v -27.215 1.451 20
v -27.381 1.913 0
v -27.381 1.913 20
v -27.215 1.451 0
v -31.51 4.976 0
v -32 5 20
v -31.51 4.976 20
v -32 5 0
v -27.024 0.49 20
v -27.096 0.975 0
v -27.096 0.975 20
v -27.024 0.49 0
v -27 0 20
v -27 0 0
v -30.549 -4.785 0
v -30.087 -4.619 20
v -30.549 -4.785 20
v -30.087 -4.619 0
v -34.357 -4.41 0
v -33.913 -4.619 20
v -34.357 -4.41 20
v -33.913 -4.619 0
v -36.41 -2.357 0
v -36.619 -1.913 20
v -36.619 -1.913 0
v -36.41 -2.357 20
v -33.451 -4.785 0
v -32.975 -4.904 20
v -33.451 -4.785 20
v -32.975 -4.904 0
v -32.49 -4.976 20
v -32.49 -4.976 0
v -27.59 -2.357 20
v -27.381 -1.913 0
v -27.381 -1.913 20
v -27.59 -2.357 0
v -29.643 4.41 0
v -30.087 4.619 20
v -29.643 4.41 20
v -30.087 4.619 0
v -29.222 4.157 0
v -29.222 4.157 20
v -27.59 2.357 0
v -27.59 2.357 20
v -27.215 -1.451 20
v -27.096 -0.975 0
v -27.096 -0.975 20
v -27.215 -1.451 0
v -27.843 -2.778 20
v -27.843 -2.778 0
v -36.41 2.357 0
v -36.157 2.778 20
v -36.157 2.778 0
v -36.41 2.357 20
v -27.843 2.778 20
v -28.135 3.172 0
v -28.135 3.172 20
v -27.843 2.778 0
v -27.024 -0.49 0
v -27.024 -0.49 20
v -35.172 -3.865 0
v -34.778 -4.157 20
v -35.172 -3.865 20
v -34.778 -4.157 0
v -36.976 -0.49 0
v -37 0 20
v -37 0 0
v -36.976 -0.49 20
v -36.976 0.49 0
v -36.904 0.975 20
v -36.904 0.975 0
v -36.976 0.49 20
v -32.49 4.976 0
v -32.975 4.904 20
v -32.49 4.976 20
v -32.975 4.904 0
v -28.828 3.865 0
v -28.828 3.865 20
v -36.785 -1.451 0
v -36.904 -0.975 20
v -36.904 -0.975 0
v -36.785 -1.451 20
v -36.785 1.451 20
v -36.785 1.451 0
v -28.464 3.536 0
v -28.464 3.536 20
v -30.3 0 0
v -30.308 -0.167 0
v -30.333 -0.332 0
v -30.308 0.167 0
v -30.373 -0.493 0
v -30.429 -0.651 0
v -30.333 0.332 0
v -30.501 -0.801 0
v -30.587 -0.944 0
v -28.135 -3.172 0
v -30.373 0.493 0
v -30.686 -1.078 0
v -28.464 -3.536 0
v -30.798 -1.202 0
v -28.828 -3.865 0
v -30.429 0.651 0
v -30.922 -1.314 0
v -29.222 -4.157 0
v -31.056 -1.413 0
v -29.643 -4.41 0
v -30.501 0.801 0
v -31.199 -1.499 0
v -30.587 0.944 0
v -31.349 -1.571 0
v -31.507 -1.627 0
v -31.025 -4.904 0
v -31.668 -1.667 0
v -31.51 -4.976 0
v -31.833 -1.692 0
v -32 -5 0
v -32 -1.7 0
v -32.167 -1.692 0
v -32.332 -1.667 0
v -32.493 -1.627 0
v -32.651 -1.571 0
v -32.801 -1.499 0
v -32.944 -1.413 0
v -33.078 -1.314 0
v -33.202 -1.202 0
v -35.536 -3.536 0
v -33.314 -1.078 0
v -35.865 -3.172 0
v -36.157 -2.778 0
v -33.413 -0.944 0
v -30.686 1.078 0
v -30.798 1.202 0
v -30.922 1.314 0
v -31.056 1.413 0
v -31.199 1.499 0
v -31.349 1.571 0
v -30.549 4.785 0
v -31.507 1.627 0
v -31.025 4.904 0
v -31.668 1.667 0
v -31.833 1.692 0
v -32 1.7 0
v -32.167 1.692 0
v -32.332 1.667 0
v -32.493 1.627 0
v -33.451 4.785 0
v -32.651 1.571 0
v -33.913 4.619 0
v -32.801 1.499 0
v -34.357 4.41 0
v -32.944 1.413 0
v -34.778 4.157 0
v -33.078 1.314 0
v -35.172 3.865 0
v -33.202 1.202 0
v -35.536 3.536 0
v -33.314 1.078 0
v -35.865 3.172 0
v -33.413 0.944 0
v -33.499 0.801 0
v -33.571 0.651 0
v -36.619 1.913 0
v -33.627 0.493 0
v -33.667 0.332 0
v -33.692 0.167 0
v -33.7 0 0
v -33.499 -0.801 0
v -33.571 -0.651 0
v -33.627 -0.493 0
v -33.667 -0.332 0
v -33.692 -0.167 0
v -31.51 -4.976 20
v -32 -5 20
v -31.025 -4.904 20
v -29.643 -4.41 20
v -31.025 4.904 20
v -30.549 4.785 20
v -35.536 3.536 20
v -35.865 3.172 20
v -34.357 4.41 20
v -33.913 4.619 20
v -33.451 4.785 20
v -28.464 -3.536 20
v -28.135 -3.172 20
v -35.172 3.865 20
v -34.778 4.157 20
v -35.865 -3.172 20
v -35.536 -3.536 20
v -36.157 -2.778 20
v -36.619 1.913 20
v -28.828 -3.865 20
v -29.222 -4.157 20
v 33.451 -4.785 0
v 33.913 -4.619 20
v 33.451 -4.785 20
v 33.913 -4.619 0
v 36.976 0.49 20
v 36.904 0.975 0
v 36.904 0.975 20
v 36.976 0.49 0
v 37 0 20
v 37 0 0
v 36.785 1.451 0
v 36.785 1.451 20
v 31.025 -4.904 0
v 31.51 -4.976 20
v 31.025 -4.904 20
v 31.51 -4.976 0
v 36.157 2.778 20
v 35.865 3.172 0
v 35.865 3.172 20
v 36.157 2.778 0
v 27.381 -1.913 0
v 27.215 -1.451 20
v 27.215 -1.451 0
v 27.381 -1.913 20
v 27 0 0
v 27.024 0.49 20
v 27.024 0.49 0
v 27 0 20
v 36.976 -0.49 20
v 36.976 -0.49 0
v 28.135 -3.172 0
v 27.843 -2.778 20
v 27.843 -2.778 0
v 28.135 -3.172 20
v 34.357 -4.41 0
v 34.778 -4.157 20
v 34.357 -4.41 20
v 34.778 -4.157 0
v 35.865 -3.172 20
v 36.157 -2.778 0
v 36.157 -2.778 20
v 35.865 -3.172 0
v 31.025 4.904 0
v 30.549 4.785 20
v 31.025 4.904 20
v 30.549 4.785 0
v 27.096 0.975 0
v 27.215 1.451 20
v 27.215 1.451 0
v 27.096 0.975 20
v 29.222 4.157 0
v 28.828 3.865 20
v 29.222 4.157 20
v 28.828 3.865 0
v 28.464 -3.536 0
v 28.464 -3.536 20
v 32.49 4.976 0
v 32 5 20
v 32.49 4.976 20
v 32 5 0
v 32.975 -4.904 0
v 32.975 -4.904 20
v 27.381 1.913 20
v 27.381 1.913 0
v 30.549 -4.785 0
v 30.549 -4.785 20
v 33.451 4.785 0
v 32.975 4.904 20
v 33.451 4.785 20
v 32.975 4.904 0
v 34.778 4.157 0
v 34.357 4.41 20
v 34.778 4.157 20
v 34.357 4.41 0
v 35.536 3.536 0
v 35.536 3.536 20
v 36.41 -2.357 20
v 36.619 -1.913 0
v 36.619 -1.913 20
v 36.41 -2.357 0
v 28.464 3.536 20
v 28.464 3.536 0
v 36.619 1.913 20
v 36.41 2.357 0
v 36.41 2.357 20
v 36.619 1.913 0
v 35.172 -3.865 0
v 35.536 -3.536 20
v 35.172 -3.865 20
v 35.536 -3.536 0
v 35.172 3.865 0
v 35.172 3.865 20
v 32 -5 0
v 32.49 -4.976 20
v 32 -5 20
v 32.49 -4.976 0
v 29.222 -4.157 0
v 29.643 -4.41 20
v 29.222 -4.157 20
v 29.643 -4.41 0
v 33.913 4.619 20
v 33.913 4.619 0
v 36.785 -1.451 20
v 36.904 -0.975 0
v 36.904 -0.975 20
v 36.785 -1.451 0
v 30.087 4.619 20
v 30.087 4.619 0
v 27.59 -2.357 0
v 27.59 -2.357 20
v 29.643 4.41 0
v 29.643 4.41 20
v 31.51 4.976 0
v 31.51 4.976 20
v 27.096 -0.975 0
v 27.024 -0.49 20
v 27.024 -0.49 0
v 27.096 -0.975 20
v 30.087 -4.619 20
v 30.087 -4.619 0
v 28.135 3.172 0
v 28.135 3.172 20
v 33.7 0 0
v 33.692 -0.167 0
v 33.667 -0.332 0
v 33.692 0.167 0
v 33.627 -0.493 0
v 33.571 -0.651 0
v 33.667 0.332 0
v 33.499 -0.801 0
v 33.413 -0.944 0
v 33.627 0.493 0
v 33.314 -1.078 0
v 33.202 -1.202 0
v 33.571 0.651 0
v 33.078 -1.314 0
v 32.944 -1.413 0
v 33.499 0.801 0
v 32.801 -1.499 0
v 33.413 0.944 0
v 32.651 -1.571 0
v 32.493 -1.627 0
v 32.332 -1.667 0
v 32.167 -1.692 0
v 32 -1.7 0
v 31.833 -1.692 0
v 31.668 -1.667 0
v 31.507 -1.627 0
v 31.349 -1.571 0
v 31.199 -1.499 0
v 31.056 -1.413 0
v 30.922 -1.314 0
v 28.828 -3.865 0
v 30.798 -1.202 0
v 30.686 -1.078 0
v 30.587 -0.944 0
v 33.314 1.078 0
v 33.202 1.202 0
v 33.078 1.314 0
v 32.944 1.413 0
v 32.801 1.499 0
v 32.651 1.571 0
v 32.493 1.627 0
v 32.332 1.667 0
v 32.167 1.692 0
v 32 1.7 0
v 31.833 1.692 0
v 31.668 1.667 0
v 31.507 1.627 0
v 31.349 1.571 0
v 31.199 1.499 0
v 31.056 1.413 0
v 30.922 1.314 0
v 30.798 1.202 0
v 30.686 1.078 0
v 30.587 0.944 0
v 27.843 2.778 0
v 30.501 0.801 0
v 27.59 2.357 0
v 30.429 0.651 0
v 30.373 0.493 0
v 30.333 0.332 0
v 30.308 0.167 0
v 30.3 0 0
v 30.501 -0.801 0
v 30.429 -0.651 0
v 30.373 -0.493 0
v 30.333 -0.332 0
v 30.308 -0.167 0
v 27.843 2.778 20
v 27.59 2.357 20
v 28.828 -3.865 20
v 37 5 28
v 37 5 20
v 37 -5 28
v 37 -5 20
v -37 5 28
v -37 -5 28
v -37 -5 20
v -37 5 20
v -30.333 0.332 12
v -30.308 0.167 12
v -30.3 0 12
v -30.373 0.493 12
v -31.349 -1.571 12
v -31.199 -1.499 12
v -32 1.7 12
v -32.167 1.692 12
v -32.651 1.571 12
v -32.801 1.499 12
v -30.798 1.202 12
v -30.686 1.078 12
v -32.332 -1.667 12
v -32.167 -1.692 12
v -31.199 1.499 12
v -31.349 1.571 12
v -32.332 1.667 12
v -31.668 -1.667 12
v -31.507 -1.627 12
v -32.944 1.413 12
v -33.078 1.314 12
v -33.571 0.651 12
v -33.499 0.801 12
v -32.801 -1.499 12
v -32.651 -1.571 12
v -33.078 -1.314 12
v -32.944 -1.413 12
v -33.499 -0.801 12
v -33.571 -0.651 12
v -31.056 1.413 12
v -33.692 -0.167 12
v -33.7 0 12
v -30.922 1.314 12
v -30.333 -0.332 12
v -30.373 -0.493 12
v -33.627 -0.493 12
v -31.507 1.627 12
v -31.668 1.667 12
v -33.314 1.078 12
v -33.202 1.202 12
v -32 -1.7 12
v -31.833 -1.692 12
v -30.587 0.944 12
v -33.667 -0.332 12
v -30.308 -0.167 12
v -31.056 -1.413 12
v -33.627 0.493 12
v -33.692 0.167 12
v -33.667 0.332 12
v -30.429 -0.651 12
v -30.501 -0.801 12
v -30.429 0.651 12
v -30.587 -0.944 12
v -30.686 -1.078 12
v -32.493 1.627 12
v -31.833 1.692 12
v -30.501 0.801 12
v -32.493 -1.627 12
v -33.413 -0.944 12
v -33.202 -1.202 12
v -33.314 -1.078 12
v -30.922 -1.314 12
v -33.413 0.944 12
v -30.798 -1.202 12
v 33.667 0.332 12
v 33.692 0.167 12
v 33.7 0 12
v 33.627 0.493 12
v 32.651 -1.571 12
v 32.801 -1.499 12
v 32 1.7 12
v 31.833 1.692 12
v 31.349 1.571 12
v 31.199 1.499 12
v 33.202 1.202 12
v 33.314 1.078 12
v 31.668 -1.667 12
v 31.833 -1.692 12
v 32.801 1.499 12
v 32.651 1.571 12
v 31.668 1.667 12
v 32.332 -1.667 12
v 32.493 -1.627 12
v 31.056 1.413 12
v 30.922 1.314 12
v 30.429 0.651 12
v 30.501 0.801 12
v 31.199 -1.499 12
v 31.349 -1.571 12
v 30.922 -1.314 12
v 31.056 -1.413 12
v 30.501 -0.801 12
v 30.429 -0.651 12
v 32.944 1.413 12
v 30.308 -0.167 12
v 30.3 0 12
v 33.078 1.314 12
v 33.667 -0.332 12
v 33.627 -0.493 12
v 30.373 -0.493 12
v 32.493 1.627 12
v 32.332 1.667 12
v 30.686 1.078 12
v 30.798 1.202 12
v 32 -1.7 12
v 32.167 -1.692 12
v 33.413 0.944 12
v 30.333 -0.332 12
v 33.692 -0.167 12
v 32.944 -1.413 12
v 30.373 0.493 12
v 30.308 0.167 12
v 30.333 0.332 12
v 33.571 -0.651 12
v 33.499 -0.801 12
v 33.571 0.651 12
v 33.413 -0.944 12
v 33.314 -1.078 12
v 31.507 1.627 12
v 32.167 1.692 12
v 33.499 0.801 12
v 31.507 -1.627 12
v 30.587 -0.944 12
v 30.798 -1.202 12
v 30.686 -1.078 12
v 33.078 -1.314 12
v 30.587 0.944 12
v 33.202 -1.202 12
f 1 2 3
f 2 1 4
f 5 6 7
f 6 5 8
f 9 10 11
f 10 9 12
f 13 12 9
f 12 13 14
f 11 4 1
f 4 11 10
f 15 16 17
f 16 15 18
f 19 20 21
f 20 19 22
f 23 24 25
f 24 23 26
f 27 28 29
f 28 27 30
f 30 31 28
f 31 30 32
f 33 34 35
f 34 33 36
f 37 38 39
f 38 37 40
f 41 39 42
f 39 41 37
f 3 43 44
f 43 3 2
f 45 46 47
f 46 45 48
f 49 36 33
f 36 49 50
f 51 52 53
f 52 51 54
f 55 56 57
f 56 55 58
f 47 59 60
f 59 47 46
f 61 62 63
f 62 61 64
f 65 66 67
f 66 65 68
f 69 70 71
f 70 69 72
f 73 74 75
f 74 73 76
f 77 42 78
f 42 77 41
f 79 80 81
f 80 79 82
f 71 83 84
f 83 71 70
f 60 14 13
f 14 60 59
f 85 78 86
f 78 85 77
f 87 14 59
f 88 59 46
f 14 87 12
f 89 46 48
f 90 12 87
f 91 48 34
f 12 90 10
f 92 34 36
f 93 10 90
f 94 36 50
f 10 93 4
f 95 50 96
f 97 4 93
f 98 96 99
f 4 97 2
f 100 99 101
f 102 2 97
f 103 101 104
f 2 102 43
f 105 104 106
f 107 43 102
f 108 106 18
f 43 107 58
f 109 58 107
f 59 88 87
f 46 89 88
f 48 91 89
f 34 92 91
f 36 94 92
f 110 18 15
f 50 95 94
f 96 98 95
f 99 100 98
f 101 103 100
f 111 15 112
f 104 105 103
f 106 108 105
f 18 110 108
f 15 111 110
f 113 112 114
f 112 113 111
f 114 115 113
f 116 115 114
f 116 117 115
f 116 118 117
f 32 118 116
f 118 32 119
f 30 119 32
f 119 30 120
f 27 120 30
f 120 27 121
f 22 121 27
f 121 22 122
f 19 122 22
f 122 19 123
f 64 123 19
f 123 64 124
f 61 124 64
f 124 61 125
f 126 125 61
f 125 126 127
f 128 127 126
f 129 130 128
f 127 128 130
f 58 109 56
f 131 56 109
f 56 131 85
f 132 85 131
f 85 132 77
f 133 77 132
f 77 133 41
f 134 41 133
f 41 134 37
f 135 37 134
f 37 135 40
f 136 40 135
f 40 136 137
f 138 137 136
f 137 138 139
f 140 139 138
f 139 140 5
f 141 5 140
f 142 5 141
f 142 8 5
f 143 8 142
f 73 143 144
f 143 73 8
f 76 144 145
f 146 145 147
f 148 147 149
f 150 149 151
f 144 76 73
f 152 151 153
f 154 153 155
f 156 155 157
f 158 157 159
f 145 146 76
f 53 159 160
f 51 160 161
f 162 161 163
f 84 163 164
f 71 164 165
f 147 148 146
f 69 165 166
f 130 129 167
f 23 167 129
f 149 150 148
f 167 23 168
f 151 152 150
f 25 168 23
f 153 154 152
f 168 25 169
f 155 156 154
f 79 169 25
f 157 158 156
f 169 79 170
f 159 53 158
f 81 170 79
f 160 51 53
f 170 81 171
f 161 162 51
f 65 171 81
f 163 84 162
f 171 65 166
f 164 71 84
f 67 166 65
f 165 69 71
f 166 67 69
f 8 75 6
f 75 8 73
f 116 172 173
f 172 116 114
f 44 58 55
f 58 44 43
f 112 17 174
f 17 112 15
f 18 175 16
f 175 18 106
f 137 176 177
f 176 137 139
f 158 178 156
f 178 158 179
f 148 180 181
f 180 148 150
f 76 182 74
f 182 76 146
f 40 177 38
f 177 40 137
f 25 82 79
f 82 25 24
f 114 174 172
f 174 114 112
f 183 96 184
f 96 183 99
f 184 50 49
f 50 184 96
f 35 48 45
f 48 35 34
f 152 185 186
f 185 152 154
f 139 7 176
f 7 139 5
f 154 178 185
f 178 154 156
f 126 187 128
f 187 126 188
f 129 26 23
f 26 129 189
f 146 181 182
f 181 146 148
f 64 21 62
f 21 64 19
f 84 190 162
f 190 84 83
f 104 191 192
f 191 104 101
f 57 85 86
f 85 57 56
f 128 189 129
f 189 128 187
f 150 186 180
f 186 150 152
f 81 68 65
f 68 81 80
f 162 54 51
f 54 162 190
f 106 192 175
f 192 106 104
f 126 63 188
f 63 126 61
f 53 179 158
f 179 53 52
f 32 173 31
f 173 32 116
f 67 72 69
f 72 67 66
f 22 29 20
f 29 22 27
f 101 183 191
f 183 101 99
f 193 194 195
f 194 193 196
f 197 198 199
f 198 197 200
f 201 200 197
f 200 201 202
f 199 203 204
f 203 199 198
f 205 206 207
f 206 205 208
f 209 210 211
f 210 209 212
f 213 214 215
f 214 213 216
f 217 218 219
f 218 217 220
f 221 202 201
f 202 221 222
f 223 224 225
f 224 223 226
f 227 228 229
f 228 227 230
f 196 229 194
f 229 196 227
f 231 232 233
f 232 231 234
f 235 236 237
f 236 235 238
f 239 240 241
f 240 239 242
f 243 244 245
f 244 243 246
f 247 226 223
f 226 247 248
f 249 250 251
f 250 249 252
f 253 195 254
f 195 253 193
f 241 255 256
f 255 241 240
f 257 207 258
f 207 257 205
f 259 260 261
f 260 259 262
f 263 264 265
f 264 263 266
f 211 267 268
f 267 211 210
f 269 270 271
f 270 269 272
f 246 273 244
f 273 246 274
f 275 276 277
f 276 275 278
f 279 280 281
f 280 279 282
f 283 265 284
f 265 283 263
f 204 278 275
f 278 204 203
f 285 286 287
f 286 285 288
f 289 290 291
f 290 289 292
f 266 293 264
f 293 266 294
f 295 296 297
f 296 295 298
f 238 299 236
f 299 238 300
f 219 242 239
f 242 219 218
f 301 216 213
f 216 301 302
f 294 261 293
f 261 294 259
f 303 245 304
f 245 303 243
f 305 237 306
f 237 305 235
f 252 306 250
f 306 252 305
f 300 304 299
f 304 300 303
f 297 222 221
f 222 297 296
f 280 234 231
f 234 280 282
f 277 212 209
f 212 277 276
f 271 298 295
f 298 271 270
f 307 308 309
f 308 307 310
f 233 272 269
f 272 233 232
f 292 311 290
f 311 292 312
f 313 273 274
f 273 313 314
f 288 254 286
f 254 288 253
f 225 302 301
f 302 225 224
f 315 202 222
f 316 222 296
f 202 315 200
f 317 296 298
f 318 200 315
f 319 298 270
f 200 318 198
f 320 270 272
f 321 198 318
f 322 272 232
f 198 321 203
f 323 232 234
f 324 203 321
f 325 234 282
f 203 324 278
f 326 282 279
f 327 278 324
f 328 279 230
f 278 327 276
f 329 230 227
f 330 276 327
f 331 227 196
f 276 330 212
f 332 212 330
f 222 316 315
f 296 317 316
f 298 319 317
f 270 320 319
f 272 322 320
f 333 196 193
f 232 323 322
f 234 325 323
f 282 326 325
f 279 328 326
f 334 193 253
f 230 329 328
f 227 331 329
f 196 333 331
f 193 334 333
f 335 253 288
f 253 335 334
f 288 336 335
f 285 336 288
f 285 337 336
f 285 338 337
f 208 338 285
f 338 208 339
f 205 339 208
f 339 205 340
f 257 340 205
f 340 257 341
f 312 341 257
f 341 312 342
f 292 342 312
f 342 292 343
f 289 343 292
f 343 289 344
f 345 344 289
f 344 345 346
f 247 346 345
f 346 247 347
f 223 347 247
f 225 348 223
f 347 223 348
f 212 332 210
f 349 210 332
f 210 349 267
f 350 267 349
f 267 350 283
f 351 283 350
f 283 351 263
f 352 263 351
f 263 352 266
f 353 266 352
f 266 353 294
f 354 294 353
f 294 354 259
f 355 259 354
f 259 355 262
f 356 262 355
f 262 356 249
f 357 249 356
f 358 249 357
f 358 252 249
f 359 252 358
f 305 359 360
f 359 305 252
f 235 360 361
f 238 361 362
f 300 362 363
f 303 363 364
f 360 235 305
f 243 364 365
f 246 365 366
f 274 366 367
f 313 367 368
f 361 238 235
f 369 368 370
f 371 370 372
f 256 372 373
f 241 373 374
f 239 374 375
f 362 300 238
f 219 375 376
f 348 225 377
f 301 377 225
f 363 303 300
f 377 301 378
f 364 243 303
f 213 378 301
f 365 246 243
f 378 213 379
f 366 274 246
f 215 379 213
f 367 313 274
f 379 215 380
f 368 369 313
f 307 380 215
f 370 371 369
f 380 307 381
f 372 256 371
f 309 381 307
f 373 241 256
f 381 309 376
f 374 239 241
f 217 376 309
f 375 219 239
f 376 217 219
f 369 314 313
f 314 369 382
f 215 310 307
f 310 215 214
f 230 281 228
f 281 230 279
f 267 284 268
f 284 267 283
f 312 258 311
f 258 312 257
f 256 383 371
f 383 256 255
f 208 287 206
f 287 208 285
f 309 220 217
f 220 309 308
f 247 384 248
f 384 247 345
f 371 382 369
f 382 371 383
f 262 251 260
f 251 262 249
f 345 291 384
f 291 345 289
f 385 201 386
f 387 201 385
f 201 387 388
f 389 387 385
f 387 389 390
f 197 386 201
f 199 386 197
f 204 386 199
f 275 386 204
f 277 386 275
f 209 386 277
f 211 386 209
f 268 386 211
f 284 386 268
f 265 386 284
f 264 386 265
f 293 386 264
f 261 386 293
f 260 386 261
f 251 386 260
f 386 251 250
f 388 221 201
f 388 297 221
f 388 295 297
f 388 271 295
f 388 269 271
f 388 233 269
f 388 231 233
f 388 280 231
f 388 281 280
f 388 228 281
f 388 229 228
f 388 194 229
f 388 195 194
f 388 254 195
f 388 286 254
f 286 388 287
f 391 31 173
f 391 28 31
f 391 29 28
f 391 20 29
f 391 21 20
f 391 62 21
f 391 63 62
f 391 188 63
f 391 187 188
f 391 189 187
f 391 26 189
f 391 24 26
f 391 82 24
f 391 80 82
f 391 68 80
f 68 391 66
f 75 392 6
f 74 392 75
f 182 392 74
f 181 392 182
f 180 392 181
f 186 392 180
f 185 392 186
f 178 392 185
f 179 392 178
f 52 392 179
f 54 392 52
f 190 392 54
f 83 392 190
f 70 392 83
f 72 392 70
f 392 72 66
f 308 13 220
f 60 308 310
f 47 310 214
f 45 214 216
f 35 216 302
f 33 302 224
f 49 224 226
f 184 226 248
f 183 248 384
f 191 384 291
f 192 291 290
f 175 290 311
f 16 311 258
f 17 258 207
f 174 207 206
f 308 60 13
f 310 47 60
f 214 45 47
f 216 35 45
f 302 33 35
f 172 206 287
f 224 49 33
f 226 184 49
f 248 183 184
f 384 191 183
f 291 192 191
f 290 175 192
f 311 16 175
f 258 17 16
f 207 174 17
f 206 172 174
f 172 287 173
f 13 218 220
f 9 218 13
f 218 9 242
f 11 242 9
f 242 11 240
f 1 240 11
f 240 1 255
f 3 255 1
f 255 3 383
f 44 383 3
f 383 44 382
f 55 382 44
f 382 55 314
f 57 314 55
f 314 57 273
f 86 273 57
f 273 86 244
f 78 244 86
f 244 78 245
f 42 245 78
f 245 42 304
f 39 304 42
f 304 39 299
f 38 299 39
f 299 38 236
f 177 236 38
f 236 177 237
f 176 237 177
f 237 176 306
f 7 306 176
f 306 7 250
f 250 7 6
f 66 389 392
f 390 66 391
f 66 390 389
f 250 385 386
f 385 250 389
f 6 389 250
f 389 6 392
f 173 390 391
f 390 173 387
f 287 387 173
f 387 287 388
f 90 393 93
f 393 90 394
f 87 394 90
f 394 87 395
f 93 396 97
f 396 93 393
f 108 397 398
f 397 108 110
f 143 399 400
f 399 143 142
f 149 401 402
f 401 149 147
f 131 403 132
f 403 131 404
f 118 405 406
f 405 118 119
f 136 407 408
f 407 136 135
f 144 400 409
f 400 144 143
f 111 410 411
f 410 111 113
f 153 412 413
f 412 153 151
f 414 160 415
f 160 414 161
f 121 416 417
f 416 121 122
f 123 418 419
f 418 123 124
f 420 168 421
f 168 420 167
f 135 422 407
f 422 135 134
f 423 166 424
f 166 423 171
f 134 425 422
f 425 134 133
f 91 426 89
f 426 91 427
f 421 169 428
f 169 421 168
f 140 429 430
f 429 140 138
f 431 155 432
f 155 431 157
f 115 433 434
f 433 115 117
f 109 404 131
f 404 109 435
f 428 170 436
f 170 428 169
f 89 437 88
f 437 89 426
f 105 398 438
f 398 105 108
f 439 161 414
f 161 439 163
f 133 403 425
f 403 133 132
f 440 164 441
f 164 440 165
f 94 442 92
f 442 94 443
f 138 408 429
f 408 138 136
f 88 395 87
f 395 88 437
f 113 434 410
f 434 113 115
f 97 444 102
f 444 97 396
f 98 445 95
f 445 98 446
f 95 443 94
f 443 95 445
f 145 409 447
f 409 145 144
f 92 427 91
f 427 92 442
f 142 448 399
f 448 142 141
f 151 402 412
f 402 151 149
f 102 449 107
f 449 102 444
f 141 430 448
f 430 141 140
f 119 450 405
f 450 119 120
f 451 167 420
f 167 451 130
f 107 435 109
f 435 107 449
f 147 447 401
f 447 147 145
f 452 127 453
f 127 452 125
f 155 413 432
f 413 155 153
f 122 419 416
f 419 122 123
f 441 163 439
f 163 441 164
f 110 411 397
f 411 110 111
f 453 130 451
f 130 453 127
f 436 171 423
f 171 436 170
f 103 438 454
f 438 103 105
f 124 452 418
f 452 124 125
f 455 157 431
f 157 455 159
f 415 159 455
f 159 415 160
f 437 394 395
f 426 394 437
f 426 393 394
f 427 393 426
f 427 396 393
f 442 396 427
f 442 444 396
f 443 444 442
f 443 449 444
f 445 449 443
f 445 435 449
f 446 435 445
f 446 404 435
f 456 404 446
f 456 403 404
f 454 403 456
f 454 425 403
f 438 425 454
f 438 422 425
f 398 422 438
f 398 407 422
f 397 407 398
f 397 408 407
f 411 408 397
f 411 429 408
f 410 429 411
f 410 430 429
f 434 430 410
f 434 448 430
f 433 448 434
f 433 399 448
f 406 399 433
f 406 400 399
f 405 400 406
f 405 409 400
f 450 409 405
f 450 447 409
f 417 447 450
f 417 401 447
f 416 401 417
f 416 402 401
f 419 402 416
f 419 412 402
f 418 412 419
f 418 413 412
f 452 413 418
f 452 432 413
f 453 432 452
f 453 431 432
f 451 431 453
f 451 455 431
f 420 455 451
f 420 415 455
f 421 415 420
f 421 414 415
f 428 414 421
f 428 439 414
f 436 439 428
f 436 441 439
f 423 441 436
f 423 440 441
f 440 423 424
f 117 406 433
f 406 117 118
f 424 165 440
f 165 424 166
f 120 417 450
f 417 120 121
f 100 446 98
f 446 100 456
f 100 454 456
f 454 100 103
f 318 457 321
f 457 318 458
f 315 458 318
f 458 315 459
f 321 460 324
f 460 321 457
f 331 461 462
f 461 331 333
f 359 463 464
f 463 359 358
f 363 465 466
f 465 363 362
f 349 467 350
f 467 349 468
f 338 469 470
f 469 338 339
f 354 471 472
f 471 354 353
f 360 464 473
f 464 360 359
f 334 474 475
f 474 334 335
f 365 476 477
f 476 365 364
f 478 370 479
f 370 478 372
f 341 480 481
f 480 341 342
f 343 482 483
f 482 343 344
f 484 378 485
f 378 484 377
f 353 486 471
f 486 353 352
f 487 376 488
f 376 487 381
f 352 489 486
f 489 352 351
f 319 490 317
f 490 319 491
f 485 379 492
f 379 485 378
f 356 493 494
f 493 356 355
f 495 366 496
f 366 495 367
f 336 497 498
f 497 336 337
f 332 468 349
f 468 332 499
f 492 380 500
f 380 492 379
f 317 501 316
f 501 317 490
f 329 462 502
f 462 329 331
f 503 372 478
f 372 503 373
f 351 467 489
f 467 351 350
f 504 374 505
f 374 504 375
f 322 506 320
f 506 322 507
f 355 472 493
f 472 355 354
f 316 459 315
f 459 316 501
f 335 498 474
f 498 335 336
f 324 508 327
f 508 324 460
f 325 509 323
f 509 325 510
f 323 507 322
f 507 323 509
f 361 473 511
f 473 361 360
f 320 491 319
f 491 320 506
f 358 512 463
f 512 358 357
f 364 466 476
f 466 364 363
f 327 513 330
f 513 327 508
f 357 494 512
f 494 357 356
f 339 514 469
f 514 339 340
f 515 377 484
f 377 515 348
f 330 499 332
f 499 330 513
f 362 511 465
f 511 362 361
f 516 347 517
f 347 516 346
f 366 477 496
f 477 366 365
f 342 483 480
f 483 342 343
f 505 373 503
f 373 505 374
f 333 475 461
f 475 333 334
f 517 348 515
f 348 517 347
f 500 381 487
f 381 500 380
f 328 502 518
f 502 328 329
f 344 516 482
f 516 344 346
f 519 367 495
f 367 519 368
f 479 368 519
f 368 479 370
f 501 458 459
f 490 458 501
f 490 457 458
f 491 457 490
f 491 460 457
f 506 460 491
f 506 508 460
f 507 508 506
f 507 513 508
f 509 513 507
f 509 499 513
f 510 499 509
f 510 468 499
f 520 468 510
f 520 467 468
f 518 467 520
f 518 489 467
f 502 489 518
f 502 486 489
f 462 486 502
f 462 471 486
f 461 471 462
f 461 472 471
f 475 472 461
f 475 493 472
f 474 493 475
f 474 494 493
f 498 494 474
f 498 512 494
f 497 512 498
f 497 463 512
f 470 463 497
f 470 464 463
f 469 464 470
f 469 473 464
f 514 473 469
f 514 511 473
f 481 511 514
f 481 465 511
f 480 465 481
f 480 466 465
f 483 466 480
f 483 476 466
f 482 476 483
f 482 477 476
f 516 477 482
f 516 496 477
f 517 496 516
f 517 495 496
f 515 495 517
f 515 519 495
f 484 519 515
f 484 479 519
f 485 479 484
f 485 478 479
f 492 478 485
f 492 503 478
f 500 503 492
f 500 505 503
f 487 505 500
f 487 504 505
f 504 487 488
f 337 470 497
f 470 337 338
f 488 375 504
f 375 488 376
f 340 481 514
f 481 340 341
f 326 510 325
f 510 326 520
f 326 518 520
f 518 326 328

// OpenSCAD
// Cabinet door pull handle
// Print orientation: posts stand on the bed (z = 0), bar on top (z = 20..28)

$fn = 64;

// --- Posts ---
post_d       = 10;    // post diameter
post_h       = 20;    // post height (z = 0 to 20)
post_x       = 32;    // post axis offset from centre (x = -32 and +32)

// --- Bar ---
bar_len      = 74;    // bar length (X)
bar_w        = 10;    // bar width (Y)
bar_t        = 8;     // bar thickness (Z), z = 20 to 28

// --- Screw holes ---
screw_d      = 3.4;   // screw hole diameter
screw_depth  = 12;    // hole depth from the bottom face of each post

// --- Misc ---
eps          = 0.5;   // overshoot for clean boolean cuts
overlap      = 0.01;  // small overlap so posts fuse into the bar

difference() {
    union() {
        // Posts
        for (sx = [-1, 1])
            translate([sx * post_x, 0, 0])
                cylinder(d = post_d, h = post_h + overlap);

        // Bar on top of the posts
        translate([-bar_len / 2, -bar_w / 2, post_h])
            cube([bar_len, bar_w, bar_t]);
    }

    // Screw holes up each post axis from the bottom face
    for (sx = [-1, 1])
        translate([sx * post_x, 0, -eps])
            cylinder(d = screw_d, h = screw_depth + eps);
}
